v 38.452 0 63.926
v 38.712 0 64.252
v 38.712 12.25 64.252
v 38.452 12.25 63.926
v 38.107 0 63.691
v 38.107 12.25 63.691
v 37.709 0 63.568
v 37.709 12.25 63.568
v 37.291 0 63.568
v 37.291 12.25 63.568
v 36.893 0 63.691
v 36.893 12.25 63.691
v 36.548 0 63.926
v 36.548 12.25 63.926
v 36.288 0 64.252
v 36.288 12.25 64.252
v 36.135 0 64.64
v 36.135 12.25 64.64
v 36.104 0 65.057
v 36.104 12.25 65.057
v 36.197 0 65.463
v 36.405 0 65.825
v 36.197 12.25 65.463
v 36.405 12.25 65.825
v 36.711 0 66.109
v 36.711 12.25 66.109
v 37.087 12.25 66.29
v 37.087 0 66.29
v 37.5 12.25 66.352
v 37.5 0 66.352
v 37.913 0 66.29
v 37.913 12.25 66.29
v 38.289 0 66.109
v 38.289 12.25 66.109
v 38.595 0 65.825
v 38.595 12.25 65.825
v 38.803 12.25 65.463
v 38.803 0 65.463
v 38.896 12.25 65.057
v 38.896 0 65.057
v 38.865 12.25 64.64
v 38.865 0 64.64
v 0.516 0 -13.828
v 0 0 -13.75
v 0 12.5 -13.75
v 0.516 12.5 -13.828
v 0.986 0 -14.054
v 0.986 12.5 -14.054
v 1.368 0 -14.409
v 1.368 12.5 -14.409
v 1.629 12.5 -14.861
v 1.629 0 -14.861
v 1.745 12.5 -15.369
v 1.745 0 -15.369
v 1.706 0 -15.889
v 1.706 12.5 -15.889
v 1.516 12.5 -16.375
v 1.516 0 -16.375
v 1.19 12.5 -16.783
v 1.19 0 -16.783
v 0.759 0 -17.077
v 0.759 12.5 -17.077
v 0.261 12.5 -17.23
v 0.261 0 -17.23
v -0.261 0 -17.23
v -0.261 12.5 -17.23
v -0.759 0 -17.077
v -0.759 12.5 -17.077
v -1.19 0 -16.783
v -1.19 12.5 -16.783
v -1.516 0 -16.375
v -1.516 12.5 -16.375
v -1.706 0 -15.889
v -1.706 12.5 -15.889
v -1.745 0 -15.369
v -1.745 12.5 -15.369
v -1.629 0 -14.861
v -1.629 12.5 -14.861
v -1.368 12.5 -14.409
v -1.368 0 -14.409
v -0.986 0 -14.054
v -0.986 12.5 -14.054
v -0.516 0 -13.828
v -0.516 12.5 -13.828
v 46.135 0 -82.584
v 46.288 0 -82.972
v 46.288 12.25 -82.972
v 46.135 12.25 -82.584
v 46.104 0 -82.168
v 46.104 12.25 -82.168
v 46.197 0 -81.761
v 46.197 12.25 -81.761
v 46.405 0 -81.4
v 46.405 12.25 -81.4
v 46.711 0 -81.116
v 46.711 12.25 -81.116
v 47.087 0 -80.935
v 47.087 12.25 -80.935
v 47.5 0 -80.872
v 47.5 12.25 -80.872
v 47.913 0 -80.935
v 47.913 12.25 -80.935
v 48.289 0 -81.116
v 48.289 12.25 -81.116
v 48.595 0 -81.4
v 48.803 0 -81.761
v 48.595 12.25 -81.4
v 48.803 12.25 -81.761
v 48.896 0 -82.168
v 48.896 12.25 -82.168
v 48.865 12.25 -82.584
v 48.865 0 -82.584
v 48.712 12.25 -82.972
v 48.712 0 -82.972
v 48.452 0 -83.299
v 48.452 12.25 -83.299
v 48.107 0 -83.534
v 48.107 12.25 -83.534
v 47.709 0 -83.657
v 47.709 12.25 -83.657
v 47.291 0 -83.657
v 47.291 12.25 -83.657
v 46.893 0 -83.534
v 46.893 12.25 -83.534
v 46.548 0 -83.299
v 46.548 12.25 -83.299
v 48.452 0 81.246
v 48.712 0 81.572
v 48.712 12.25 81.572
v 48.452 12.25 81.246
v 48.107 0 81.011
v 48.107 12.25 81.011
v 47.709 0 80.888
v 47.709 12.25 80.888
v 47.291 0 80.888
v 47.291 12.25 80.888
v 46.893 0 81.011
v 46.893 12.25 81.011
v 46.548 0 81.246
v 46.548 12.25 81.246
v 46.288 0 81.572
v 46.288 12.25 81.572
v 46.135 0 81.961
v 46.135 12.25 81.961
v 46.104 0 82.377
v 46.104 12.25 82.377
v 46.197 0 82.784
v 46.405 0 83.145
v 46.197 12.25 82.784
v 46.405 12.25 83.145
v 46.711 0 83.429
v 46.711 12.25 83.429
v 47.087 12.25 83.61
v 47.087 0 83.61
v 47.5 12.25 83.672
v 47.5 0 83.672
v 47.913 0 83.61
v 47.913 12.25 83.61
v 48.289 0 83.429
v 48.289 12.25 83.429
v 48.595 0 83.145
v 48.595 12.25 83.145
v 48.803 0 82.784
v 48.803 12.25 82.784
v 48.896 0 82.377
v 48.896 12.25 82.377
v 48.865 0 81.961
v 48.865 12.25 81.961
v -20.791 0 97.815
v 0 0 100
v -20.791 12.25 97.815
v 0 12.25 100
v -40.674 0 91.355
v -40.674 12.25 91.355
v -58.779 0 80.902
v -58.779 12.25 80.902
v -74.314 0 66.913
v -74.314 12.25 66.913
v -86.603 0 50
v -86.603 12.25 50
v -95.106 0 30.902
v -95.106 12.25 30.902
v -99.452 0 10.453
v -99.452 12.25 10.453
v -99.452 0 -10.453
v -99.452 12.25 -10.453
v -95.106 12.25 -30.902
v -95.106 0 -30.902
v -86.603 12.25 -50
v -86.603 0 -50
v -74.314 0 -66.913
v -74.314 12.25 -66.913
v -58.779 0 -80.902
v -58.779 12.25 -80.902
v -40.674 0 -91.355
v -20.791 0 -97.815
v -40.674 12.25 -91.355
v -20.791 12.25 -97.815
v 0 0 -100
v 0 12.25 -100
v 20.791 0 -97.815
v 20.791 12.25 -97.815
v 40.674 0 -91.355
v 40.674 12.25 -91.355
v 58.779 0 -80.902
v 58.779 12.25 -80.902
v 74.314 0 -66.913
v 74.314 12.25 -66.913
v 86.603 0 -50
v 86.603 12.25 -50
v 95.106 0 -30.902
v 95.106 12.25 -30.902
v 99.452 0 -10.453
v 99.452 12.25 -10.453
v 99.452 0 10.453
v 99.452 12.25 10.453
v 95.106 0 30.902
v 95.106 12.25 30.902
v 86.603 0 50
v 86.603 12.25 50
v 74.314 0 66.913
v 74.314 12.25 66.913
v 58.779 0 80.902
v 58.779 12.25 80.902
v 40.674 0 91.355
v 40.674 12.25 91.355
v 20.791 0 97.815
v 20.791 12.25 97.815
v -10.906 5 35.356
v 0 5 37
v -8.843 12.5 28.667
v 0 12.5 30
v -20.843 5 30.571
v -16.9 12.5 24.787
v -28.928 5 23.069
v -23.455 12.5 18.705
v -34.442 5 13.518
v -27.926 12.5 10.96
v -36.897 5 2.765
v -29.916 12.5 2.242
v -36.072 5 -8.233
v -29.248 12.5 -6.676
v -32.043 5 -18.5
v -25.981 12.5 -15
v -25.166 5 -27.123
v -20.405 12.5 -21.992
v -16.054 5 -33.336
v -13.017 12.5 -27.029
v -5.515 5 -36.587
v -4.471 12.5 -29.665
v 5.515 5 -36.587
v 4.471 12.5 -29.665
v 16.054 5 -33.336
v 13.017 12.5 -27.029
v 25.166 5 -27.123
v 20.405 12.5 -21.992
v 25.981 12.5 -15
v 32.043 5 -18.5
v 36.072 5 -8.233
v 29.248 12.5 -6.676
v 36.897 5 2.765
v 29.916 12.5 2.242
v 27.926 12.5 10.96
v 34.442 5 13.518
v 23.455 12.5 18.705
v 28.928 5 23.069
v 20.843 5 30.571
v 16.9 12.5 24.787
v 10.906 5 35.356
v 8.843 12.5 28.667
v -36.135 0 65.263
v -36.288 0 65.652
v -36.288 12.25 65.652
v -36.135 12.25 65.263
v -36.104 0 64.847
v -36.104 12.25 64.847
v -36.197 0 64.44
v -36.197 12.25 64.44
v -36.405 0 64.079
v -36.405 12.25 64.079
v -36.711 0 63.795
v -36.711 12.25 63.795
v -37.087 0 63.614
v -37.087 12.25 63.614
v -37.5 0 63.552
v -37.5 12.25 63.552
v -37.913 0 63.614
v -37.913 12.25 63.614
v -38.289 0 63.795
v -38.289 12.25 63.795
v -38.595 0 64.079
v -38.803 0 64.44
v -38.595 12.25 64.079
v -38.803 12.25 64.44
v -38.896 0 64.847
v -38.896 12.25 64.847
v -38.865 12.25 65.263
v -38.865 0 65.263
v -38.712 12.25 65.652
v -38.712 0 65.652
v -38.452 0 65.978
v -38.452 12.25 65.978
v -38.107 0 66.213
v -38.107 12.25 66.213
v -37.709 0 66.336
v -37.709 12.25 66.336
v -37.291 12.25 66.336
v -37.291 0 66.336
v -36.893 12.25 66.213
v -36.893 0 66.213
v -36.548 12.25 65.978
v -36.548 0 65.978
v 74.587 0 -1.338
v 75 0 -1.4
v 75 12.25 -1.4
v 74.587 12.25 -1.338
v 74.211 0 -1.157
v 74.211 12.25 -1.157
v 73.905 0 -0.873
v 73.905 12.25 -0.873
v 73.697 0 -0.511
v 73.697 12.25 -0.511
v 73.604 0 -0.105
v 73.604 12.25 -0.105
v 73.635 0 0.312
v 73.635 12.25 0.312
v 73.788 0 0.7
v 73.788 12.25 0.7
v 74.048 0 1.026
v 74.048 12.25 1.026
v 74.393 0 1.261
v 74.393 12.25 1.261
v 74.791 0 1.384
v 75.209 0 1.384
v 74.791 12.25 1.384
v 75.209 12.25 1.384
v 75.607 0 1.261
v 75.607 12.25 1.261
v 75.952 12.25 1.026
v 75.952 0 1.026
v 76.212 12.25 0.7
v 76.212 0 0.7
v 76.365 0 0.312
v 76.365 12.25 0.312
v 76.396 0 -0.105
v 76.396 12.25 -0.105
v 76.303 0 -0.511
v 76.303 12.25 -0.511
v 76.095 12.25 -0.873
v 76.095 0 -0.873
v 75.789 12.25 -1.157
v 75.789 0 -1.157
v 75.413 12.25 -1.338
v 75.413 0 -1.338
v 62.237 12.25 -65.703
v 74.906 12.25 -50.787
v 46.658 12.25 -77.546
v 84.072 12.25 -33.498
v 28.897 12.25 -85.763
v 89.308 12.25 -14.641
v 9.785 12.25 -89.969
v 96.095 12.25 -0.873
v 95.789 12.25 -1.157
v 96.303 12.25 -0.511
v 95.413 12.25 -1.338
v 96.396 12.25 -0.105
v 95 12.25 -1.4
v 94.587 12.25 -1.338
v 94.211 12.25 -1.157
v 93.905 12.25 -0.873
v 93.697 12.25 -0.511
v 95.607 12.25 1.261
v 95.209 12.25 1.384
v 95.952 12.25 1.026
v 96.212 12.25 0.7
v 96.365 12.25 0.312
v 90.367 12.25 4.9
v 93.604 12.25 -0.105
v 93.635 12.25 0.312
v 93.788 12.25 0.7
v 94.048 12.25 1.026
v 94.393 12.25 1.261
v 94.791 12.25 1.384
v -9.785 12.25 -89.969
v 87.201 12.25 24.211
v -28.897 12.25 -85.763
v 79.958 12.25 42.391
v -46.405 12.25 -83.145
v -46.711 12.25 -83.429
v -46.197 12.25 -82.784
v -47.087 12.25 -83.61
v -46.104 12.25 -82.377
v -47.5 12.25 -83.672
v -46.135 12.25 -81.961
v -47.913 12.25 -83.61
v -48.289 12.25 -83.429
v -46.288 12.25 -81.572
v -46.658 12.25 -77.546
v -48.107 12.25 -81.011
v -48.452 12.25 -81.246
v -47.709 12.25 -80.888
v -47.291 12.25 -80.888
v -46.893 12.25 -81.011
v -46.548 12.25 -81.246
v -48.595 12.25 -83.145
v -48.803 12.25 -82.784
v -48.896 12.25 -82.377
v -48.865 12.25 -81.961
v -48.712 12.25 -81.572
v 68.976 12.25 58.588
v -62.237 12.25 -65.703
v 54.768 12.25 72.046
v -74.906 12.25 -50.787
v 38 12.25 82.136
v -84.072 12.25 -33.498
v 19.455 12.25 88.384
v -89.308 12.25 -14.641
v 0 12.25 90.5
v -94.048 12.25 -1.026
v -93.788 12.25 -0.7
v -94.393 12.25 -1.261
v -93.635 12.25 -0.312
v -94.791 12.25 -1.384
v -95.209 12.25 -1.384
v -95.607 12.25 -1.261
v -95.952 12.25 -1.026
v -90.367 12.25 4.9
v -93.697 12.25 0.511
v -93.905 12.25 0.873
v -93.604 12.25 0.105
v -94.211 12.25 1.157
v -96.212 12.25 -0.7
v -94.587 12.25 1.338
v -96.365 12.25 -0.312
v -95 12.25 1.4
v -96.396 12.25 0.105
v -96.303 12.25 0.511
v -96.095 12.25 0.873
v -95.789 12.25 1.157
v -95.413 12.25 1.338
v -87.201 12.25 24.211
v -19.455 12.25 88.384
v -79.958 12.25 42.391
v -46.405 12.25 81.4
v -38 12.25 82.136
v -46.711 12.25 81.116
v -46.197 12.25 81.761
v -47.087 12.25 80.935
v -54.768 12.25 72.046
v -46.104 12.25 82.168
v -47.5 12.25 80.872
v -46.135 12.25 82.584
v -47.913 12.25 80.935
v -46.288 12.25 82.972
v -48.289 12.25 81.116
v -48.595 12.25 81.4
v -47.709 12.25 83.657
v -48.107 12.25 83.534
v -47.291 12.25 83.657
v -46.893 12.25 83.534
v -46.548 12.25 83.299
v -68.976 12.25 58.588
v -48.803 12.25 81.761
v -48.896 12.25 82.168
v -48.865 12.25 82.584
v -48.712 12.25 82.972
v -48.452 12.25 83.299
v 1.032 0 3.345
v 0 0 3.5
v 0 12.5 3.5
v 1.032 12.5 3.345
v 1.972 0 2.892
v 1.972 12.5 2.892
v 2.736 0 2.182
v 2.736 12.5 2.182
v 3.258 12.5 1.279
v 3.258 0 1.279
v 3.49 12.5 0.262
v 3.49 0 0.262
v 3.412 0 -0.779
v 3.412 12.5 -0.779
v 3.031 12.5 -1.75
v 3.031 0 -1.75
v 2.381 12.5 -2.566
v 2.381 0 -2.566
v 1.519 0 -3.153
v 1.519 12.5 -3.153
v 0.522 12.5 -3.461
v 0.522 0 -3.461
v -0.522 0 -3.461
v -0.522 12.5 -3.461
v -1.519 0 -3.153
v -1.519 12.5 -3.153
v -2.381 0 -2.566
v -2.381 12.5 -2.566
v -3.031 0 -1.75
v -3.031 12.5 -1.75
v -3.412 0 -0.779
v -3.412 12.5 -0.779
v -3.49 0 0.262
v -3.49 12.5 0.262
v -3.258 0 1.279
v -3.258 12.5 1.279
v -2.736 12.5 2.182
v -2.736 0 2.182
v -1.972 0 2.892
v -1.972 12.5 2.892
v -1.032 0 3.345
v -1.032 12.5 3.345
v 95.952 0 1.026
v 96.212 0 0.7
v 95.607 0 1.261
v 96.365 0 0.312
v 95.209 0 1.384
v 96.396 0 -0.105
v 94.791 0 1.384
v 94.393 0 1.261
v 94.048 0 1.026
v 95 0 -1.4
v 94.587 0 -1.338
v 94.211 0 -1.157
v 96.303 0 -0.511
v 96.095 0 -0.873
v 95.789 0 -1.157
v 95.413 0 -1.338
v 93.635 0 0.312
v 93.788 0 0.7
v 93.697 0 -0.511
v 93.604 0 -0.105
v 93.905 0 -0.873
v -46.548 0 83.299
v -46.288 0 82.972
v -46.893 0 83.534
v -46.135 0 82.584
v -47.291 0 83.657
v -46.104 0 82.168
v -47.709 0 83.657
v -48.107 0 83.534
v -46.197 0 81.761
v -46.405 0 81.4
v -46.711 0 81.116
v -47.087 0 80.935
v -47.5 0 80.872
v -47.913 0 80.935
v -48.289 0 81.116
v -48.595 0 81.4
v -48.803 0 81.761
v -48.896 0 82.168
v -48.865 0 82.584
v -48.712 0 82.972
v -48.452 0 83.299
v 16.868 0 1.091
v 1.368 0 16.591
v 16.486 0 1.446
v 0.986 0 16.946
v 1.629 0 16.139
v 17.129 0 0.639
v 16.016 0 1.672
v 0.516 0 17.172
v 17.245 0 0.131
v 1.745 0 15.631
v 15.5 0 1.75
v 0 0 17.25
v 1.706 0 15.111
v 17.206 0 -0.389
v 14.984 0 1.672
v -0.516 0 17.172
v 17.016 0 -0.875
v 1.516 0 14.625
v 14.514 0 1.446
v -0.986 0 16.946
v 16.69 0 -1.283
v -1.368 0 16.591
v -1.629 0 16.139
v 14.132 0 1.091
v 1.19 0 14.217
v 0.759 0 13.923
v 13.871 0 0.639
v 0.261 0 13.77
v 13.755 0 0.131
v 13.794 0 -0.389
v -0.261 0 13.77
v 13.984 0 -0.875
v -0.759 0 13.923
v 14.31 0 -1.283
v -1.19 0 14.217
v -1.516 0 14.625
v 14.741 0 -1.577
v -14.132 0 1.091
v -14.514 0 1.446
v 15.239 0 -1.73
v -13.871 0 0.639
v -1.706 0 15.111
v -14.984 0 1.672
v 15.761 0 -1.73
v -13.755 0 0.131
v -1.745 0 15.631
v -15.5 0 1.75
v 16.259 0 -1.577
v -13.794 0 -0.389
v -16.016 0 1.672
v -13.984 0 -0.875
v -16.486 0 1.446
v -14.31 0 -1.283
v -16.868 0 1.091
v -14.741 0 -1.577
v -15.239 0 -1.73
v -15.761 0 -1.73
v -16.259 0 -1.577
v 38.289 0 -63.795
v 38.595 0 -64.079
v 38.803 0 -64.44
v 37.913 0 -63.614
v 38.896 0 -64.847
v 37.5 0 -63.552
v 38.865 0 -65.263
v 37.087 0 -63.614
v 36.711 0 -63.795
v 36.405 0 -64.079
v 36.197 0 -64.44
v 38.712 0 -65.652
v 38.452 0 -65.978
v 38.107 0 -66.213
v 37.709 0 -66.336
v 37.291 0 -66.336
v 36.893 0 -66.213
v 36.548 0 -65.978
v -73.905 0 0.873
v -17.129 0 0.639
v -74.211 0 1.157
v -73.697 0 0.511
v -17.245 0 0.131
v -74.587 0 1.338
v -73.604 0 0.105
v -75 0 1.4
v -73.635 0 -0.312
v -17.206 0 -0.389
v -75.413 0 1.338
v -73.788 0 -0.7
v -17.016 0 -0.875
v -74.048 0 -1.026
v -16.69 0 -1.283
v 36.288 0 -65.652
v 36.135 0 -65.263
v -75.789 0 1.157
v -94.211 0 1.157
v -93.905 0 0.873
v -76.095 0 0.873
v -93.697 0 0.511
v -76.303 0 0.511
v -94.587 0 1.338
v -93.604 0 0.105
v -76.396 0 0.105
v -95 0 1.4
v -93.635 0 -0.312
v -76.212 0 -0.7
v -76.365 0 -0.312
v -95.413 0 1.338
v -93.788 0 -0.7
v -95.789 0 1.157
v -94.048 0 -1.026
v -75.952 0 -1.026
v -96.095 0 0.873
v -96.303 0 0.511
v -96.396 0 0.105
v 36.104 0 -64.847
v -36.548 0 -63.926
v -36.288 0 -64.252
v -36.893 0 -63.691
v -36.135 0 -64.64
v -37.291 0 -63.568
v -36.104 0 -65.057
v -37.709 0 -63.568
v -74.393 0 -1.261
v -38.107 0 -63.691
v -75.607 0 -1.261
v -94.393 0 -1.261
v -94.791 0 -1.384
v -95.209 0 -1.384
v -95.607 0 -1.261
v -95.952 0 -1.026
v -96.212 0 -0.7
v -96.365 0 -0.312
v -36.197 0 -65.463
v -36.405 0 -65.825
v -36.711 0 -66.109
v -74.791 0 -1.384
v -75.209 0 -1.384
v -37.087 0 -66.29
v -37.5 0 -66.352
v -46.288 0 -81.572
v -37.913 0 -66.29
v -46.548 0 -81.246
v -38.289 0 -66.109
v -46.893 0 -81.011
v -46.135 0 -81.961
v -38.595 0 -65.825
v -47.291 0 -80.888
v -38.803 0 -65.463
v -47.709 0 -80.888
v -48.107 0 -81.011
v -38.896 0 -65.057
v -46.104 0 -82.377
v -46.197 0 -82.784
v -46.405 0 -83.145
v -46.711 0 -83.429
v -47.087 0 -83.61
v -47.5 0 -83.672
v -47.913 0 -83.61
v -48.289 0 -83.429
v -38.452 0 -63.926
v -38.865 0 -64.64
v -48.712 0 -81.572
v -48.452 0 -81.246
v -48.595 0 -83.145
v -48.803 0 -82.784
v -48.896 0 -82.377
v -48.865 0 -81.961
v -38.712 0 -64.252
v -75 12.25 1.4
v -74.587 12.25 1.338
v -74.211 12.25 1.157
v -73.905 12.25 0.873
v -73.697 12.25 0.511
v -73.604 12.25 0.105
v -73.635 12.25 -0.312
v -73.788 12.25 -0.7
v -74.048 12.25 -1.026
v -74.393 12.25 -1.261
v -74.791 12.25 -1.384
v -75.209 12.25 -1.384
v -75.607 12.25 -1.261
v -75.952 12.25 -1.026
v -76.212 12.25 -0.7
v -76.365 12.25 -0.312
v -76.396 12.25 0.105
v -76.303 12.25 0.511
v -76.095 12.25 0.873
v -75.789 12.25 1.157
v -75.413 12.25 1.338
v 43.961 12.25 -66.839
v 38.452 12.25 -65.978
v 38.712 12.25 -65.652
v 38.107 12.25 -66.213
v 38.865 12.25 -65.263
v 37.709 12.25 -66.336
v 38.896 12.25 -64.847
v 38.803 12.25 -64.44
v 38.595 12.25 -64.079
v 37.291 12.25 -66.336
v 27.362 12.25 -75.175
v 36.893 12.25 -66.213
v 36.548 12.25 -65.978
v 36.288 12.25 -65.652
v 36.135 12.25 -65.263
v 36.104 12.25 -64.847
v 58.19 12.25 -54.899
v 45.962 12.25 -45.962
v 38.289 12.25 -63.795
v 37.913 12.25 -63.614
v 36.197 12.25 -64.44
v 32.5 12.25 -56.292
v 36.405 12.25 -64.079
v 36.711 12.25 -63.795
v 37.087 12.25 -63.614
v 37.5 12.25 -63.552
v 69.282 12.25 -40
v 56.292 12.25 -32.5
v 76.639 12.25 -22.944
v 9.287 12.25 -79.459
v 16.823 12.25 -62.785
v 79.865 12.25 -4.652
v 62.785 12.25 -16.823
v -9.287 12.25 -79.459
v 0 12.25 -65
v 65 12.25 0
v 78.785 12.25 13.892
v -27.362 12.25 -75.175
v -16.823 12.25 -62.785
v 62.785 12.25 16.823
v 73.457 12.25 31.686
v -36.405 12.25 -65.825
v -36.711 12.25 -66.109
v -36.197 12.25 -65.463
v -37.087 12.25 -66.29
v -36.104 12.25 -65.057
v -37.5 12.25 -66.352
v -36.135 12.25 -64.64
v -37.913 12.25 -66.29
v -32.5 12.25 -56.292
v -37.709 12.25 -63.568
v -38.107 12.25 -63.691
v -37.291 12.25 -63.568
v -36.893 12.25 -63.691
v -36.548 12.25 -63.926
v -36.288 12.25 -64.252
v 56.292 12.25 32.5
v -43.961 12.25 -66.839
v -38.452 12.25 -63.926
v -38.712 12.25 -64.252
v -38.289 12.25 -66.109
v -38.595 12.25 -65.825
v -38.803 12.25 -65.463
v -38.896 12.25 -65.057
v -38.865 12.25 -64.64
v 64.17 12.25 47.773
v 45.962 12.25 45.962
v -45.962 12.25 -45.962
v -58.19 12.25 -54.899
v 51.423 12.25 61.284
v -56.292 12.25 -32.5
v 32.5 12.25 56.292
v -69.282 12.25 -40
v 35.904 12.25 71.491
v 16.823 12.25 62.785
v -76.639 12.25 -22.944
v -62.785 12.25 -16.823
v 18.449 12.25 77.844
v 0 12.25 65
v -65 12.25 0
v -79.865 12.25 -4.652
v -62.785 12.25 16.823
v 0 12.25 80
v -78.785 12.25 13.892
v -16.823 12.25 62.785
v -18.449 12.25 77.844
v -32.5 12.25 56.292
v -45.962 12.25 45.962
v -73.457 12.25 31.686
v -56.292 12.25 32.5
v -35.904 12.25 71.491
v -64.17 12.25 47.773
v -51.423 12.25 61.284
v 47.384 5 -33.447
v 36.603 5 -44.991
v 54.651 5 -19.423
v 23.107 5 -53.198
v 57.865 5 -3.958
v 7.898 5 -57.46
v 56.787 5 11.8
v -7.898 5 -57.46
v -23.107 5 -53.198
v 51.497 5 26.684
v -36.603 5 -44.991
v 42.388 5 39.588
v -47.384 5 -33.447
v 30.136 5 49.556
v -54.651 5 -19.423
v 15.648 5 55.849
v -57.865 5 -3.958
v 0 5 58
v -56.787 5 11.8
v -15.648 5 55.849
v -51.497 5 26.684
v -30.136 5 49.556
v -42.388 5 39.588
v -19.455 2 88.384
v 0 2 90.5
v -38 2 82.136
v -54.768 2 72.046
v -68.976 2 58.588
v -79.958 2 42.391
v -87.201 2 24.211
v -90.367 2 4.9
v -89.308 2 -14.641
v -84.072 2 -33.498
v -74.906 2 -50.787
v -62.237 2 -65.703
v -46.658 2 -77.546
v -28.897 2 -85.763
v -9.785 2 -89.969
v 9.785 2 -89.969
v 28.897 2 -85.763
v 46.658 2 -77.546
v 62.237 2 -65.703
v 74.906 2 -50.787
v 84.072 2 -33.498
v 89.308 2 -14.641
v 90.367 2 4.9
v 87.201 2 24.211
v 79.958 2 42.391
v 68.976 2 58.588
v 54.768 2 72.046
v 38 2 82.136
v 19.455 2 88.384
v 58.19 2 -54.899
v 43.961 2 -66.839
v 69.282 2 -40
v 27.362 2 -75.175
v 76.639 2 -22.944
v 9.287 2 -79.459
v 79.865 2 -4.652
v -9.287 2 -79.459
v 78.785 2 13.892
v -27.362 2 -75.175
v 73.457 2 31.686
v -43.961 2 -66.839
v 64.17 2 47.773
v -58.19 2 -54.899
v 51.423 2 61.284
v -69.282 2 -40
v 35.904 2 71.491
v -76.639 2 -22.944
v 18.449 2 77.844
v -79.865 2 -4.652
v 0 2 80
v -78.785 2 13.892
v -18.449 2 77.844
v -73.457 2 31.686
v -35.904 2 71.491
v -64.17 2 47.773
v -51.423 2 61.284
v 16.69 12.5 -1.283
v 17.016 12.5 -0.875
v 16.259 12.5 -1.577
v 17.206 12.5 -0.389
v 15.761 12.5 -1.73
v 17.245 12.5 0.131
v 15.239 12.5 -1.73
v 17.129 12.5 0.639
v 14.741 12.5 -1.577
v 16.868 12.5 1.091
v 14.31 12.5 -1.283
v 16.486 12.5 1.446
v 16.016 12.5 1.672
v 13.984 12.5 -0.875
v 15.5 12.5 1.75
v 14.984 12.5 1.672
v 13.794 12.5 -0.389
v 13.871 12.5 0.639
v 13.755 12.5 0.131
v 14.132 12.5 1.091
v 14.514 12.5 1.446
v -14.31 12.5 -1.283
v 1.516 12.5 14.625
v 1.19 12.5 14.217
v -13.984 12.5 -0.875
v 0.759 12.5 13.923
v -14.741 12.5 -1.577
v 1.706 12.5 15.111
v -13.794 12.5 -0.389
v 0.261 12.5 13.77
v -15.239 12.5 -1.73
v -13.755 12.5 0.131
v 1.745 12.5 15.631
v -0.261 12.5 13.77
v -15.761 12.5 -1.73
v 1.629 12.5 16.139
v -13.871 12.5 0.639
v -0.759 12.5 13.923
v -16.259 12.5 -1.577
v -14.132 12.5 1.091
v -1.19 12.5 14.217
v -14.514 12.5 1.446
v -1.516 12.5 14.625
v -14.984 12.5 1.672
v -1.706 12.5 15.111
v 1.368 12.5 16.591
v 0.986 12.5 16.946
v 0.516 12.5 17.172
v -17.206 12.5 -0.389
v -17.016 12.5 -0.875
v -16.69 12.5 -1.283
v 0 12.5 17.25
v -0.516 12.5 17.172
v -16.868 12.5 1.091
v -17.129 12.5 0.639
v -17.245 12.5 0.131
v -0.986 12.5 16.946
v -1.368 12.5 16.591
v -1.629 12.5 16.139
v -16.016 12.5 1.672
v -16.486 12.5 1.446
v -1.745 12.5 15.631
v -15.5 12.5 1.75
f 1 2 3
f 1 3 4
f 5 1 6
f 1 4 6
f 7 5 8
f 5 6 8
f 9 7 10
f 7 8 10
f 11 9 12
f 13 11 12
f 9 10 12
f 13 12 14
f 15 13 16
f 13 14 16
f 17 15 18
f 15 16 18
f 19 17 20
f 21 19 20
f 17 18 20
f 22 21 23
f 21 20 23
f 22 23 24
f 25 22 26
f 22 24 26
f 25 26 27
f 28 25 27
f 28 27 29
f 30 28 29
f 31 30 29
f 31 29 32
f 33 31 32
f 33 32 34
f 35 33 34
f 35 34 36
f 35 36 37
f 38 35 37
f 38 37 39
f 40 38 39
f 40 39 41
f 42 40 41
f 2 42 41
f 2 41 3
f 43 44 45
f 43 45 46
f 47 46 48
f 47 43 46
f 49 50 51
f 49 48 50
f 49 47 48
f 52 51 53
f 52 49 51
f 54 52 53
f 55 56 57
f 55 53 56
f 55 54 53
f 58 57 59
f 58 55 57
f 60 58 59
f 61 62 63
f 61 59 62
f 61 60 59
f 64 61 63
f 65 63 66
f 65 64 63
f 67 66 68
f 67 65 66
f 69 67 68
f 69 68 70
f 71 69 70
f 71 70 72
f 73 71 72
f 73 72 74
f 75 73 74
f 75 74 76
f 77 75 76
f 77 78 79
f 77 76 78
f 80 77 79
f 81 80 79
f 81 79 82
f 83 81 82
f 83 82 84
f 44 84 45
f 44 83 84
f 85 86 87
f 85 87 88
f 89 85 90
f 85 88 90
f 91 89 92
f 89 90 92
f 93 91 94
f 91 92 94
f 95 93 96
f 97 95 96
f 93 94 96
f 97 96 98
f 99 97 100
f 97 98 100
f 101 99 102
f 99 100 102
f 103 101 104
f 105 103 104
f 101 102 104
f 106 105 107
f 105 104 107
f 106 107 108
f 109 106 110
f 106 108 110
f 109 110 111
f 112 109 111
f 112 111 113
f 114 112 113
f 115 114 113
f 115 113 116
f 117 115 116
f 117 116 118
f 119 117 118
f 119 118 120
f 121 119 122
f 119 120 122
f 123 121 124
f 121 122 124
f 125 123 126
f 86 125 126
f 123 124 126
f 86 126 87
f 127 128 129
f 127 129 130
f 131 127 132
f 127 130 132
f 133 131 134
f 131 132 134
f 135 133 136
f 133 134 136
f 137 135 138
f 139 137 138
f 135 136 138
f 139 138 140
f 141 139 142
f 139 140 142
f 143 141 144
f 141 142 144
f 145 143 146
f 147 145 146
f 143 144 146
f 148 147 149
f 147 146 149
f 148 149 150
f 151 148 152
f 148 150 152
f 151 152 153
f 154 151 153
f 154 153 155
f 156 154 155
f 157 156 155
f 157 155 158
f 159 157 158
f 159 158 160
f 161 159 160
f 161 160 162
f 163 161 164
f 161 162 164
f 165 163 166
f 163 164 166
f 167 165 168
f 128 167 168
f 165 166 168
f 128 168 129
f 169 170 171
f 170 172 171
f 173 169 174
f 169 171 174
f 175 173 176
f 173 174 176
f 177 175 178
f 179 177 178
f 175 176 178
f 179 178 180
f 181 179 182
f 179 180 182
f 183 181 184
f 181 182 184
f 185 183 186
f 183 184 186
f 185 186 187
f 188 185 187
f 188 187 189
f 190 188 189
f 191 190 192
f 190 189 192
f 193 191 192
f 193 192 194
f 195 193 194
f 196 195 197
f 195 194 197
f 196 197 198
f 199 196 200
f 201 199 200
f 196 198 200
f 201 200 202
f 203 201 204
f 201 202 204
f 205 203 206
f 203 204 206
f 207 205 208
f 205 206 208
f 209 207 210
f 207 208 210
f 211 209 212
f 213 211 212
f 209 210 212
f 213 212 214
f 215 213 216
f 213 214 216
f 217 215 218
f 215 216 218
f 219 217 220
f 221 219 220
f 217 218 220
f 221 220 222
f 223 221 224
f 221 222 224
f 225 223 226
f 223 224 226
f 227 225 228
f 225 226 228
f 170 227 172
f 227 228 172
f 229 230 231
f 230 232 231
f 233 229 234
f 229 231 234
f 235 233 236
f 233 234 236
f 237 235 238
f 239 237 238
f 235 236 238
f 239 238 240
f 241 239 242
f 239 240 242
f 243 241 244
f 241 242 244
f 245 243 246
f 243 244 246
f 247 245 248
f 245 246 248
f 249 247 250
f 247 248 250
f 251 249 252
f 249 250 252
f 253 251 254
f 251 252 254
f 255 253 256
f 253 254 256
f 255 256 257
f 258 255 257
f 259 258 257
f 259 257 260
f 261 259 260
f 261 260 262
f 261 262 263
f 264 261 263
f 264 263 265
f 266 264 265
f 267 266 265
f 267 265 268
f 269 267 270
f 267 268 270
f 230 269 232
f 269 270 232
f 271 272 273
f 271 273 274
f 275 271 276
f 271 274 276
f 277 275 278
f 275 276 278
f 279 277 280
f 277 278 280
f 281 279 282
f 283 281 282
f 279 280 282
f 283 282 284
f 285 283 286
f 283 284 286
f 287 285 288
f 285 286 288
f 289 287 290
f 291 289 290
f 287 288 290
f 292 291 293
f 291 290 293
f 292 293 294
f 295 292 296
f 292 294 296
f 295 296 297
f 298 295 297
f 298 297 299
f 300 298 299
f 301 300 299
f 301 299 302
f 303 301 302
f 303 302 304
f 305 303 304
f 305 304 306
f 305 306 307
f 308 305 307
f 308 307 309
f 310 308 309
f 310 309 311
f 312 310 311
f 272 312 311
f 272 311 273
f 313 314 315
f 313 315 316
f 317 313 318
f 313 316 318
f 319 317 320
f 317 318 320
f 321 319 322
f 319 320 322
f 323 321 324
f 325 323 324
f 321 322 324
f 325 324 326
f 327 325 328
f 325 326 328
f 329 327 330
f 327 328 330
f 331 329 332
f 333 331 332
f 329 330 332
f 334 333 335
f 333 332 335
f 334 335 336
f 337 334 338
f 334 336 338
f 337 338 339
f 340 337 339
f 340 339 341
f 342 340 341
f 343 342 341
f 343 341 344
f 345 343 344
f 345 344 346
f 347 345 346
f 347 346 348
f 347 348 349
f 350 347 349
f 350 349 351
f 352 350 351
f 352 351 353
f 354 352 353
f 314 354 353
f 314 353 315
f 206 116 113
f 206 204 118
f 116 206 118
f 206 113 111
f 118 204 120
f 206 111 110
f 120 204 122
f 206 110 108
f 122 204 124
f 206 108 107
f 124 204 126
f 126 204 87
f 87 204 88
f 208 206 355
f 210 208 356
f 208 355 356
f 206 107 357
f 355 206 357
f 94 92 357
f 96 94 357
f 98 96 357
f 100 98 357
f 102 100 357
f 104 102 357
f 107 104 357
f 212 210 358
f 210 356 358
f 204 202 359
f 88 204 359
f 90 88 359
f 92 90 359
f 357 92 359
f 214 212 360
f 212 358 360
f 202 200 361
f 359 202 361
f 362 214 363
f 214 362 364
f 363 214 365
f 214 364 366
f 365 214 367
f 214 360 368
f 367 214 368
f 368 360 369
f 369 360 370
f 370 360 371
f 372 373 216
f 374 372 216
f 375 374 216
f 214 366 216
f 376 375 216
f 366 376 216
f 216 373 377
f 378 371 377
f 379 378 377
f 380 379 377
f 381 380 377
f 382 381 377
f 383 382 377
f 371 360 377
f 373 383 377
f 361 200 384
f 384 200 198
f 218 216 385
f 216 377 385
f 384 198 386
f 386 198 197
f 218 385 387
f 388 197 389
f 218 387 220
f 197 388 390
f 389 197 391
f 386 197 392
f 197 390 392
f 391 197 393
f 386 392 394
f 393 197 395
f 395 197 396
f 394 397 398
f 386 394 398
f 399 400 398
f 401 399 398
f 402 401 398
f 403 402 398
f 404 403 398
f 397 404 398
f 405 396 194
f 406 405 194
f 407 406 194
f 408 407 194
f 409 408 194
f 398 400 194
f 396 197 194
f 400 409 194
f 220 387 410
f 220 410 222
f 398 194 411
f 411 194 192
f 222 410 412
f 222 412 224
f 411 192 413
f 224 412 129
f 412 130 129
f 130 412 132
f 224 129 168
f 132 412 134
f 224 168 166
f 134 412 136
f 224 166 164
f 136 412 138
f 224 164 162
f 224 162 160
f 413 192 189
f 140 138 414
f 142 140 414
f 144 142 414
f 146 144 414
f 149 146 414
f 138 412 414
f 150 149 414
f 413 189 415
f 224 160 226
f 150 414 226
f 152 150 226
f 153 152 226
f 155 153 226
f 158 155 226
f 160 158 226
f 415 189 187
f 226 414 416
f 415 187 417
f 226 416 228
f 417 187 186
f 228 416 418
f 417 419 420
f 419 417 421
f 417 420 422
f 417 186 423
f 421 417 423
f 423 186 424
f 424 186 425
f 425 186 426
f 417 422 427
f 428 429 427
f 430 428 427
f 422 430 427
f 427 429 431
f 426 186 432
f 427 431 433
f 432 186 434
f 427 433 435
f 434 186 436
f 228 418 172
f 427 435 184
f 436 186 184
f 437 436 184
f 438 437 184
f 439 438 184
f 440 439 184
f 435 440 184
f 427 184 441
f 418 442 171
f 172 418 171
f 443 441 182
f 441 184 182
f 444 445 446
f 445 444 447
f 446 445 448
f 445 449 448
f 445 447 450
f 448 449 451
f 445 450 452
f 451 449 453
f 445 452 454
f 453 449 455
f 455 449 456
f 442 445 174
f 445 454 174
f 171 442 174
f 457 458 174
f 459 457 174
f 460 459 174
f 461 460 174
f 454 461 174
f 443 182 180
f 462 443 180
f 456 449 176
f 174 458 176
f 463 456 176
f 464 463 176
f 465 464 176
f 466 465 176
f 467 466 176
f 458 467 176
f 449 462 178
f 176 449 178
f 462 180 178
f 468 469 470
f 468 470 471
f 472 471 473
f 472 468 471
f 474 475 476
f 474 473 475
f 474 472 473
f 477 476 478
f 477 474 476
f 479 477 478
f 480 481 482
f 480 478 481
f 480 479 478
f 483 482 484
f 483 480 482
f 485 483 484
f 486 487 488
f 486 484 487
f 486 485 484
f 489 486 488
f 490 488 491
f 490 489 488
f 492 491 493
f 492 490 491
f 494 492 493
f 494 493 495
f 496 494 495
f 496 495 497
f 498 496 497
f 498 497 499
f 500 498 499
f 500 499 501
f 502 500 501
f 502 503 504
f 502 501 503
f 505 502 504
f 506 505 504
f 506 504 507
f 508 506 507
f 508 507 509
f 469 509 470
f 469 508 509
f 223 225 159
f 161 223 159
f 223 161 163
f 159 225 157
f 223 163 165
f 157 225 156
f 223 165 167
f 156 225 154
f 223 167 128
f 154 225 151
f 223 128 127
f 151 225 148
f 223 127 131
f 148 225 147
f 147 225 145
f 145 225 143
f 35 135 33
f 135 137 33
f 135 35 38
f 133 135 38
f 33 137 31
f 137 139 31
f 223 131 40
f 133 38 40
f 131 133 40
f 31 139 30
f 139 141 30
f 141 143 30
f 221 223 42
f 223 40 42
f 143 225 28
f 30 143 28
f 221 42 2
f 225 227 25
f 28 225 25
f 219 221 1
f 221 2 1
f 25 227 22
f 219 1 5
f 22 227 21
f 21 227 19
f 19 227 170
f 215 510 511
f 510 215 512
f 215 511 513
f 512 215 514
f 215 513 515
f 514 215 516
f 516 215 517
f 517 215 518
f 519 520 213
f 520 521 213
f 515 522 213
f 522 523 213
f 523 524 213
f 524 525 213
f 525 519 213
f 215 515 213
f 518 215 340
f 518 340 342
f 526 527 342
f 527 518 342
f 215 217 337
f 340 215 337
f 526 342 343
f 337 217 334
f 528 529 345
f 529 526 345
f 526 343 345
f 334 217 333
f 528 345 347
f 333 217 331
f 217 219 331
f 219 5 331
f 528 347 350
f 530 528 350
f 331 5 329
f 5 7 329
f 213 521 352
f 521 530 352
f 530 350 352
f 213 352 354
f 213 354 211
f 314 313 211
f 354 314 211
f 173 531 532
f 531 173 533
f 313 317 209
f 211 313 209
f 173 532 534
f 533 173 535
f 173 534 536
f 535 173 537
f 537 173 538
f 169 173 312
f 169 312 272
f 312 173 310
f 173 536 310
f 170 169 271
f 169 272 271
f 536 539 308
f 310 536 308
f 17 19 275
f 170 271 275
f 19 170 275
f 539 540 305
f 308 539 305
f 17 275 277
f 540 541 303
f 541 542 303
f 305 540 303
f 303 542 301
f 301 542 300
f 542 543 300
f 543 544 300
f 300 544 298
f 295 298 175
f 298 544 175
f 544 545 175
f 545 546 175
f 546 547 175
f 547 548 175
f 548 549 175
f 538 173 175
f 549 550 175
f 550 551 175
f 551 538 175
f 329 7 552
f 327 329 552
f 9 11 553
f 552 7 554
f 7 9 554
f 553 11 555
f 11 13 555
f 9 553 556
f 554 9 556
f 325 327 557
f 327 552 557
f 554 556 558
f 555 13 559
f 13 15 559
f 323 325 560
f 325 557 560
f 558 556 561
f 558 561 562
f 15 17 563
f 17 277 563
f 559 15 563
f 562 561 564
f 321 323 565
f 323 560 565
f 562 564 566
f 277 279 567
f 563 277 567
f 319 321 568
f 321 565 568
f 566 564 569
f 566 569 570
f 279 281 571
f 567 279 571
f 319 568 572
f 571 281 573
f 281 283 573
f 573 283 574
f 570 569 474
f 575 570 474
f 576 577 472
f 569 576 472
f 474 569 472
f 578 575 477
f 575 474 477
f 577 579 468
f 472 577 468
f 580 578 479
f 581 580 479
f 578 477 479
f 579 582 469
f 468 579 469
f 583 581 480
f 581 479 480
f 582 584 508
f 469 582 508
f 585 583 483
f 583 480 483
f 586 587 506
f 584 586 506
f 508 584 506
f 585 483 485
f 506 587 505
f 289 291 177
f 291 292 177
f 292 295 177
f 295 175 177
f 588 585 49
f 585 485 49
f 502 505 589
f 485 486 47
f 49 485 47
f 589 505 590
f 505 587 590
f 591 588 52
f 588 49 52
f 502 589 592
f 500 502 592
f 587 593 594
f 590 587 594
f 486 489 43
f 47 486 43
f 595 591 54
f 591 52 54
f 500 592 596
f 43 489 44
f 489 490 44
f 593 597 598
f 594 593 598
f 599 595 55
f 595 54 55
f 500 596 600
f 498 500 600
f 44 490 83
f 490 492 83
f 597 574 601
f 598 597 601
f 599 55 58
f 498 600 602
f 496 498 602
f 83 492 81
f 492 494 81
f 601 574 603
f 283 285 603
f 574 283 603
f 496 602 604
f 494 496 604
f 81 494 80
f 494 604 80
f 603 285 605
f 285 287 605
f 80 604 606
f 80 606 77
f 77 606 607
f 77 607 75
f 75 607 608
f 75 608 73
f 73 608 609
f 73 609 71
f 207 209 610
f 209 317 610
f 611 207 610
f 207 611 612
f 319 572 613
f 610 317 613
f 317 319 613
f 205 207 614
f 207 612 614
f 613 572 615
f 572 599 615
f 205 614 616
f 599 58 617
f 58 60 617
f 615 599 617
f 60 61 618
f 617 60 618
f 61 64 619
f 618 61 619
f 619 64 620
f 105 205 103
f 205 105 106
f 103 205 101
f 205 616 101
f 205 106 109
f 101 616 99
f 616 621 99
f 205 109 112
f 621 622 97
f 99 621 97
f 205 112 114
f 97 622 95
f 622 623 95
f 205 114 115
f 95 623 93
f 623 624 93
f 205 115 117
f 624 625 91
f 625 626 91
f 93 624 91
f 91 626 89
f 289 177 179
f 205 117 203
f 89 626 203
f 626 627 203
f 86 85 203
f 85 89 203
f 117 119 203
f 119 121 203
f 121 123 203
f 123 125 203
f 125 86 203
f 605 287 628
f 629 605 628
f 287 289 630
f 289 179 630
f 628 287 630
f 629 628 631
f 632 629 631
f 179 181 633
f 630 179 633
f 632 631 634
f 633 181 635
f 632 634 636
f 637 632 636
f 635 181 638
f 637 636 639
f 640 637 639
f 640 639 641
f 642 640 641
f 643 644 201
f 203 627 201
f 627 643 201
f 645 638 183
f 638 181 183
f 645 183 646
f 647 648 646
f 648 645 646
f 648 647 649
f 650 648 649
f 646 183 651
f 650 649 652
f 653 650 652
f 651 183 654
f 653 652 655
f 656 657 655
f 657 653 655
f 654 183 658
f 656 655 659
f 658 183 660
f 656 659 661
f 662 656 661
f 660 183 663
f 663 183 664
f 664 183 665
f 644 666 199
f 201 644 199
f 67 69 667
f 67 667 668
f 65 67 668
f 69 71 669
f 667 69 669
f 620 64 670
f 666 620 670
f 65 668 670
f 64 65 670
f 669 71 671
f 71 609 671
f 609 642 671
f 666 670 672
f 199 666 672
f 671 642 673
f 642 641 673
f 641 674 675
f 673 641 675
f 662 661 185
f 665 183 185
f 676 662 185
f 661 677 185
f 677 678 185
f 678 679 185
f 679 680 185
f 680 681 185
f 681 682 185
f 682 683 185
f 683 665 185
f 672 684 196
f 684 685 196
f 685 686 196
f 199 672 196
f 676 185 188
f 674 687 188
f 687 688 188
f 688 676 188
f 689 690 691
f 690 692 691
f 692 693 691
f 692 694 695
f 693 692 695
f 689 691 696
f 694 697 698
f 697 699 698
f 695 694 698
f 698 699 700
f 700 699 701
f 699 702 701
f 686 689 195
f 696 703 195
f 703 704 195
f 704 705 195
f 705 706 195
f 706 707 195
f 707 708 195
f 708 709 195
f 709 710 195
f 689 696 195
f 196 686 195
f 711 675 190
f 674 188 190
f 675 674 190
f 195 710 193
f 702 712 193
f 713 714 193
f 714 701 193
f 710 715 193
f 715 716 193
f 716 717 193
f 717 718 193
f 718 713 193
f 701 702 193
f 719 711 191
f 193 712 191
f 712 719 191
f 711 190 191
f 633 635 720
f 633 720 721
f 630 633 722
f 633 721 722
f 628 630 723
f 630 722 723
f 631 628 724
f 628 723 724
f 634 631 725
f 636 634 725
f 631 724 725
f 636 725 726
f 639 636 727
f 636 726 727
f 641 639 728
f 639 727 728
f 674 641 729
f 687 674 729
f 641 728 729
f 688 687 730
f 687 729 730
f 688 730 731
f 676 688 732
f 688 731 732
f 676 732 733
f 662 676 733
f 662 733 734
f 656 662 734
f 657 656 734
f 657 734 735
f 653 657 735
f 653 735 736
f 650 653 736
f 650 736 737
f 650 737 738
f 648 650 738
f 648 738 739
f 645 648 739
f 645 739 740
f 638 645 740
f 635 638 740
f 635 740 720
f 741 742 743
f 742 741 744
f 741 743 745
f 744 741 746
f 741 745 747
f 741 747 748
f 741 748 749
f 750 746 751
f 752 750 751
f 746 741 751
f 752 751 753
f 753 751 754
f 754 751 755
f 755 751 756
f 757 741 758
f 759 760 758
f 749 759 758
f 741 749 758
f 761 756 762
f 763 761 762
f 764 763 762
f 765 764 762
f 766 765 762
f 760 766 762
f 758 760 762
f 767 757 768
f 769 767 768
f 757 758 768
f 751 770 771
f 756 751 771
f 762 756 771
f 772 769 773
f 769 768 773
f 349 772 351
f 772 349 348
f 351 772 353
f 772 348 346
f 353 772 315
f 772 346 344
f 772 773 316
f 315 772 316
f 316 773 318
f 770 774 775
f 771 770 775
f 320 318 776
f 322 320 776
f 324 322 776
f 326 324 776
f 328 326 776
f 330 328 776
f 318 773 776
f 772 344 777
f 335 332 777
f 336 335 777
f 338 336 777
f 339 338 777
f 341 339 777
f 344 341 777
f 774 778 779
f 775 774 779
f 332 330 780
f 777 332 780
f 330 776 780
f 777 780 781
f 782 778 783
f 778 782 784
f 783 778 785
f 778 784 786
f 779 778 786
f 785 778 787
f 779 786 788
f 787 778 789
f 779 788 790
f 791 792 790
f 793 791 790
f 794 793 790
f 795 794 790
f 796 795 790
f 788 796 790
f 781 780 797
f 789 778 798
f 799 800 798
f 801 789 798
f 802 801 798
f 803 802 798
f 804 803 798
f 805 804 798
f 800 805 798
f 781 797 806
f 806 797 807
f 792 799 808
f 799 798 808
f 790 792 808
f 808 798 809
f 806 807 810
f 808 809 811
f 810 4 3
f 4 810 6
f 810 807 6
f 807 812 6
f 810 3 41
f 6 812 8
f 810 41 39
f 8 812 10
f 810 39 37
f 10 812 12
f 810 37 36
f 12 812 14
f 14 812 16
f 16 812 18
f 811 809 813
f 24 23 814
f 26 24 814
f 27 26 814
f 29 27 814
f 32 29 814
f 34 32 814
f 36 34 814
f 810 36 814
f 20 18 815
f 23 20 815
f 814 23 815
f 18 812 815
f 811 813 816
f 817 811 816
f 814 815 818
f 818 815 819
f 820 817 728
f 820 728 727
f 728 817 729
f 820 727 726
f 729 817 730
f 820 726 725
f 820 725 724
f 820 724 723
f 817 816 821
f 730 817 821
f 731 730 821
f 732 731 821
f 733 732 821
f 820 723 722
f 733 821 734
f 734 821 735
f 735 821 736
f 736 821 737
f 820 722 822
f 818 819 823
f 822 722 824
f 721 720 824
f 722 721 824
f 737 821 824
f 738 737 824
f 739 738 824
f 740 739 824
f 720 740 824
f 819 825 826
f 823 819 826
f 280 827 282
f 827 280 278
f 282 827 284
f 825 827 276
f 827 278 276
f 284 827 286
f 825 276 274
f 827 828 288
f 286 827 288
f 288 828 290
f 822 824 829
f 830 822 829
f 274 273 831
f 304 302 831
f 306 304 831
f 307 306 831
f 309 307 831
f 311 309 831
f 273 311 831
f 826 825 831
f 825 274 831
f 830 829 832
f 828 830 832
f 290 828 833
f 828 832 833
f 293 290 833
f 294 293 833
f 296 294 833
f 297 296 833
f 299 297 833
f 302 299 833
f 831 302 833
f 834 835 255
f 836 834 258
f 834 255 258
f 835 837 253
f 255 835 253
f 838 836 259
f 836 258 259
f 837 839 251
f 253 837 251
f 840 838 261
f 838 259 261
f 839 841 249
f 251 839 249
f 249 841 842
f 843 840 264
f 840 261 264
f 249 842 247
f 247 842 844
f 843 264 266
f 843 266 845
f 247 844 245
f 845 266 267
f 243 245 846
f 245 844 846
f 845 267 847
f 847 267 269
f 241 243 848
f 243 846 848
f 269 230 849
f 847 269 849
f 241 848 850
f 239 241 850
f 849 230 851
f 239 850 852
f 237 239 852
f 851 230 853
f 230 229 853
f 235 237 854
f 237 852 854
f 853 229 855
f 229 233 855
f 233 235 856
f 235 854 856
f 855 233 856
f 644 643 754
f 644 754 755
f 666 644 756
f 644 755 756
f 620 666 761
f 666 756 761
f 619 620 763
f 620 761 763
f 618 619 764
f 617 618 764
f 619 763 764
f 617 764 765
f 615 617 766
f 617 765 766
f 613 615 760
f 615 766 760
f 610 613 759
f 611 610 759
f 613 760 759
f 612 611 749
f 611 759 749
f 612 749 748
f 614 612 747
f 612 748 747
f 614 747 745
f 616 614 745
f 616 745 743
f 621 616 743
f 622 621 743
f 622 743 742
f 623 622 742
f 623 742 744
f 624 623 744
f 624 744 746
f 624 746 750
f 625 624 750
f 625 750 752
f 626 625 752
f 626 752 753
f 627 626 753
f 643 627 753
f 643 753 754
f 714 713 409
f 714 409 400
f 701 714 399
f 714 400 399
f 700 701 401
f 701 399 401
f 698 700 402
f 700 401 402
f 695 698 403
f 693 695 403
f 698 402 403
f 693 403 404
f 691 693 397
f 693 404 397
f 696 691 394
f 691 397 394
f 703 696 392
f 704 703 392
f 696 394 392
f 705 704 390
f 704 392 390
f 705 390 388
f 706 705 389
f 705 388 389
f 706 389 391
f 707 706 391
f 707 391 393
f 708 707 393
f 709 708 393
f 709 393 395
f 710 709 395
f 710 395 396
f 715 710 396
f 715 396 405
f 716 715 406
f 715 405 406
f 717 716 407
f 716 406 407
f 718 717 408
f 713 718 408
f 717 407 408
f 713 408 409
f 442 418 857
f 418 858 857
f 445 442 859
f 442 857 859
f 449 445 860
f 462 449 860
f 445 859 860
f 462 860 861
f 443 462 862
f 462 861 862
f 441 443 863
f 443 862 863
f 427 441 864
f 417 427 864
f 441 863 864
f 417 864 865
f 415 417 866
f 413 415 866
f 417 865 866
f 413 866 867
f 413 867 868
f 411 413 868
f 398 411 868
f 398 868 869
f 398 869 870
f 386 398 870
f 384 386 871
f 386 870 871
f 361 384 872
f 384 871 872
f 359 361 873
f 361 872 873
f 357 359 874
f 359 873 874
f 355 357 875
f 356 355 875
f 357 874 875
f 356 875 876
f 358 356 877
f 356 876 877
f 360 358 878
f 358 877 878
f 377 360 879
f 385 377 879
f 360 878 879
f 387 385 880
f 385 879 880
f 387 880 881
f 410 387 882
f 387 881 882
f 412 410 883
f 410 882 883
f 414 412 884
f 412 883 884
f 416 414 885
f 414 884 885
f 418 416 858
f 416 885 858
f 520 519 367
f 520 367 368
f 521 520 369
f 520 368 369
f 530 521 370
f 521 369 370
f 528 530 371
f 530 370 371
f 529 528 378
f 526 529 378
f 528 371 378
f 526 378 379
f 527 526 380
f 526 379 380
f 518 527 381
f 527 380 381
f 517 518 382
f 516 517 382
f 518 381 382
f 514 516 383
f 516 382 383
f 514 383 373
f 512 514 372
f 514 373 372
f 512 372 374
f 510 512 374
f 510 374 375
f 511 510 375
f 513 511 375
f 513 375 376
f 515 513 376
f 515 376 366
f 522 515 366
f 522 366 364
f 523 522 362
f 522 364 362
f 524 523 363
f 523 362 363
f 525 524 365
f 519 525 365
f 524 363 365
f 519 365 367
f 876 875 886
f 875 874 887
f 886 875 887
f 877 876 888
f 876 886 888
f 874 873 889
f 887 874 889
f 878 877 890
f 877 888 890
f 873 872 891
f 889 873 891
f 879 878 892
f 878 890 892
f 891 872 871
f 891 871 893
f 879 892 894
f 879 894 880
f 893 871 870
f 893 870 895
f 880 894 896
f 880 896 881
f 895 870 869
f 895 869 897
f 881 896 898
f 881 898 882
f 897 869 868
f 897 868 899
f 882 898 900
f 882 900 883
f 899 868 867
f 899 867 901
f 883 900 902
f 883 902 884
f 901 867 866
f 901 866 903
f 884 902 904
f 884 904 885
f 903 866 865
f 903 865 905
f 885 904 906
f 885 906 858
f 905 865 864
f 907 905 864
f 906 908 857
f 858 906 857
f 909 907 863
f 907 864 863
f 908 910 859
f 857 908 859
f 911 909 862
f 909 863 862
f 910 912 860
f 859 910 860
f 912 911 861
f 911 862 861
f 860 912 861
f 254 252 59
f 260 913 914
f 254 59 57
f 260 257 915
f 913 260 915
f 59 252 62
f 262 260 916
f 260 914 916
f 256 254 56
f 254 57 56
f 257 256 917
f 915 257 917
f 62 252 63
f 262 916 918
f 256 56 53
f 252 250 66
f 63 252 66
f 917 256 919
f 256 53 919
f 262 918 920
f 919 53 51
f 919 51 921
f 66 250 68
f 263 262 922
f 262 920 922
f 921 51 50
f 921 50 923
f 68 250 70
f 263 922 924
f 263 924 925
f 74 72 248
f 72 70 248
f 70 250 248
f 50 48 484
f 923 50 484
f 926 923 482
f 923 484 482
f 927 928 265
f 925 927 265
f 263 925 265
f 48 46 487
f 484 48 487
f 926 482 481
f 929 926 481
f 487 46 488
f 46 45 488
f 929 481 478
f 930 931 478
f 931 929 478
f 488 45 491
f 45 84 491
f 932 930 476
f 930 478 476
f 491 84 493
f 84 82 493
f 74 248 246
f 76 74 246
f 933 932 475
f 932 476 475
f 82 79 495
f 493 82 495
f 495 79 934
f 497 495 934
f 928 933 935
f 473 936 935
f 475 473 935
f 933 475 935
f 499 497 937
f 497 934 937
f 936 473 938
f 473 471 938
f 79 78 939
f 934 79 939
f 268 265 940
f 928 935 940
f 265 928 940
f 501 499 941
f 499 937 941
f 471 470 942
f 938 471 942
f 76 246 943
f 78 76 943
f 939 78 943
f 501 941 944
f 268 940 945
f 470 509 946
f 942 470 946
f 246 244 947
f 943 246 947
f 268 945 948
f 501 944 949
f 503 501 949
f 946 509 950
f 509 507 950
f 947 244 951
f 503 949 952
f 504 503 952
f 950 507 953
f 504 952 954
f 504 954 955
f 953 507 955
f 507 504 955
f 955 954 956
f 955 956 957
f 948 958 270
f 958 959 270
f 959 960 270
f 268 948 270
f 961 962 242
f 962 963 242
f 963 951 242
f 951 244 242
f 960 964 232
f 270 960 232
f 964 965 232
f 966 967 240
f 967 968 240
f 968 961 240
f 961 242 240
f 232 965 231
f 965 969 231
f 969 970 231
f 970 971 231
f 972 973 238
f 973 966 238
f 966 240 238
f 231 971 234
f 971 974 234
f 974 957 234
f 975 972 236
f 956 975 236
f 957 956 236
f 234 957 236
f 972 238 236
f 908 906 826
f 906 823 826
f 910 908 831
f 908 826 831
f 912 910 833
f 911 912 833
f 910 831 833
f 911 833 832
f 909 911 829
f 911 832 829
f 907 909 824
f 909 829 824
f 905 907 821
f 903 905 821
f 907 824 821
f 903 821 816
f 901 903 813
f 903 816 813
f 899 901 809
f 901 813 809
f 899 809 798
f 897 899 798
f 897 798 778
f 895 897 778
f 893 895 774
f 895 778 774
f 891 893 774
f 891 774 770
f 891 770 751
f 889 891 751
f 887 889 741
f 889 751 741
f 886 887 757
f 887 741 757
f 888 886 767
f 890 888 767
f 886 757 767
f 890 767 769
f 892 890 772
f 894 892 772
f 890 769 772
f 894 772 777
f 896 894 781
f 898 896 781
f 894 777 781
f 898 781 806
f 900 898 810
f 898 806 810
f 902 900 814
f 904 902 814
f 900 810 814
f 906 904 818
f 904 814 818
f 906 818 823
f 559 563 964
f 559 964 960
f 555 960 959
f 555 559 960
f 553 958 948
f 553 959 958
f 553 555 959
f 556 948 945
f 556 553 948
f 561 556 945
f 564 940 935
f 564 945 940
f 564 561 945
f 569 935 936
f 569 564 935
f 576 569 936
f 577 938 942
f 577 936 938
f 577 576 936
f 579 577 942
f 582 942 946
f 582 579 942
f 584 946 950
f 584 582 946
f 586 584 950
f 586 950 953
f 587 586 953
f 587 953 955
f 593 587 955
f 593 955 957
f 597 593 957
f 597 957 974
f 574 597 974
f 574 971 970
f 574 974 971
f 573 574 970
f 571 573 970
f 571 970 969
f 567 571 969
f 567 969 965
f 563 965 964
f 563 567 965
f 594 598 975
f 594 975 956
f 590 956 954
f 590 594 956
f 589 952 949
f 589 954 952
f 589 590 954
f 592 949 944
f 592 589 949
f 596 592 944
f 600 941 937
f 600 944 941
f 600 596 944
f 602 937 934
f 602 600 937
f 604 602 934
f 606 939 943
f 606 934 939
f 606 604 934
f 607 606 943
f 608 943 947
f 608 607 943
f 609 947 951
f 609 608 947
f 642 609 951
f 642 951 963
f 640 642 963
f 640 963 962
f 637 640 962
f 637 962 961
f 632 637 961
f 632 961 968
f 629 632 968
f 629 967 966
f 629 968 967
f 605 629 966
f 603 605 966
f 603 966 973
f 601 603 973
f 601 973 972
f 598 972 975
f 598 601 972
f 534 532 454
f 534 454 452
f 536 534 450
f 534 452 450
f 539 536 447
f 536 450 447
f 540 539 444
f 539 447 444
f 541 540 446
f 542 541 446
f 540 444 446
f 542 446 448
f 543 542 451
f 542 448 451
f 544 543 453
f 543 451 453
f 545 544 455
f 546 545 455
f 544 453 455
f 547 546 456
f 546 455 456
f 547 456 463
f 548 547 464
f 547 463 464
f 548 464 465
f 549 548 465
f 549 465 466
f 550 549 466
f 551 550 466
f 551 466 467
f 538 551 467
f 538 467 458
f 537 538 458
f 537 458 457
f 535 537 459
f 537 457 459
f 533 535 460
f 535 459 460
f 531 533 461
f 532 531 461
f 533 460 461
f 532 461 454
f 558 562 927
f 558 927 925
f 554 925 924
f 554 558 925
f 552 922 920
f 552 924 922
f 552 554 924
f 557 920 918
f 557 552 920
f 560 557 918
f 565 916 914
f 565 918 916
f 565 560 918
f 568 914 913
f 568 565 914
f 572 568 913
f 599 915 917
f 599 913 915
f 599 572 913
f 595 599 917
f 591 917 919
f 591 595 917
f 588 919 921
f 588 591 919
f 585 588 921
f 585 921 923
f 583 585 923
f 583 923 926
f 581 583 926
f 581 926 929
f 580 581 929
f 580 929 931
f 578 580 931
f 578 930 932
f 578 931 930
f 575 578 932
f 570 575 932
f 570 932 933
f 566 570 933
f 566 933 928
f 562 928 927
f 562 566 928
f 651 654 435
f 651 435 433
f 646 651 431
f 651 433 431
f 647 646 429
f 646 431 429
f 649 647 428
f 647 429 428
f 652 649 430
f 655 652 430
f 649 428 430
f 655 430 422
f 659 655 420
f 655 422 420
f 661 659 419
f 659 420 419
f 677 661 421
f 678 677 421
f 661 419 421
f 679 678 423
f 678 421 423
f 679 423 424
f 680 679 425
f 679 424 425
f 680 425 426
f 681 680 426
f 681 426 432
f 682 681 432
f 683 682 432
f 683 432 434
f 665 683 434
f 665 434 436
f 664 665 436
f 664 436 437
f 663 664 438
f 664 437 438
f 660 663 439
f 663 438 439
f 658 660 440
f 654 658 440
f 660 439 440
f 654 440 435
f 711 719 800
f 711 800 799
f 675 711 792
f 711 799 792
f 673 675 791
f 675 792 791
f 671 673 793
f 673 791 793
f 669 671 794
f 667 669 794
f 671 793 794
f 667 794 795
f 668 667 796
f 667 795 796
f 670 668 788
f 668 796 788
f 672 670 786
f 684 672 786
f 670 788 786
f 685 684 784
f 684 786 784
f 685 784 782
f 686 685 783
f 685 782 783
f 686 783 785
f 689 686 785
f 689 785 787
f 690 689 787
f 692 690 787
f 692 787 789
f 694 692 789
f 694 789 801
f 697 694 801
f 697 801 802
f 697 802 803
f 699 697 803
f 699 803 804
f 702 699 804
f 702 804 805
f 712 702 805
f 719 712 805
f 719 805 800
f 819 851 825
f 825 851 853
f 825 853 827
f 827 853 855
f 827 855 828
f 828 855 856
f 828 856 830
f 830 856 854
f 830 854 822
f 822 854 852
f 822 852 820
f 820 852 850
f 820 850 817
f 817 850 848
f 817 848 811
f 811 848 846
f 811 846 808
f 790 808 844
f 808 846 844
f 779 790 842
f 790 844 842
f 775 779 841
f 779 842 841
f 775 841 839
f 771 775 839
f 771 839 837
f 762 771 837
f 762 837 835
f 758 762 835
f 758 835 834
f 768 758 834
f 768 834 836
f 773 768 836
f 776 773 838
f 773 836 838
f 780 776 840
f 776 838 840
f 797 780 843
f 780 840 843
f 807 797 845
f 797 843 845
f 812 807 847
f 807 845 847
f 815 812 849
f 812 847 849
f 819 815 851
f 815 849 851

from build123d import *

# Parameters (mm, degrees)
KES_EKSTR_ZYON3_DEPTH      = 142.972708645
KES_EKSTR_ZYON3_DEPTH_BACK = 142.972708645
IZIM3_R                    = 3.5
IZIM3_R_2                  = 1.75
IZIM4_R                    = 1.4
KES_EKSTR_ZYON4_DEPTH      = 142.972708645
DAIRESEL_KAPLAMA1_COUNT    = 6


with BuildPart() as part:
    # Çizim2 → Döndür1 (revolve)
    with BuildSketch(Plane(origin=(0, 0, 0), x_dir=(0, 0, -1), z_dir=(1, 0, 0))):
        Polygon((0, 0), (-100, 0), (-100, 12.25), (-90.5, 12.25), (-90.5, 2), (-80, 2), (-80, 12.25), (-65, 12.25), (-58, 5), (-37, 5), (-30, 12.5), (0, 12.5), align=None)
    revolve(axis=Axis((0, 27.631034793, 0), (0, -1, 0)))

    # Çizim3 → Kes-Ekstrüzyon3 (cut, two sides: drawn at the far end of the back side and taken through both)
    with BuildSketch(Plane(origin=(0, 12.5, 0), x_dir=(1, 0, 0), z_dir=(0, 1, 0)).offset(-KES_EKSTR_ZYON3_DEPTH_BACK)):
        with Locations(Location((0, 0, 0), (0, 0, 270))):
            Circle(IZIM3_R)
        with Locations(Location((-15.5, 0, 0), (0, 0, 270))):
            Circle(IZIM3_R_2)
        with Locations(Location((0, -15.5, 0), (0, 0, 270))):
            Circle(IZIM3_R_2)
        with Locations(Location((0, 15.5, 0), (0, 0, 270))):
            Circle(IZIM3_R_2)
        with Locations(Location((15.5, 0, 0), (0, 0, 270))):
            Circle(IZIM3_R_2)
    extrude(amount=KES_EKSTR_ZYON3_DEPTH + KES_EKSTR_ZYON3_DEPTH_BACK, mode=Mode.SUBTRACT)

    # Çizim4 → Kes-Ekstrüzyon4 (cut, symmetric)
    with BuildSketch(Plane(origin=(0, 12.5, 0), x_dir=(1, 0, 0), z_dir=(0, 1, 0))):
        with Locations(Location((-75, 0, 0), (0, 0, 270))):
            Circle(IZIM4_R)
        with Locations(Location((-95, 0, 0), (0, 0, 270))):
            Circle(IZIM4_R)
    kes_ekstr_zyon4 = extrude(amount=KES_EKSTR_ZYON4_DEPTH, both=True, mode=Mode.SUBTRACT)

    # Dairesel Kaplama1: Kes-Ekstrüzyon4 ×6 about axis
    dairesel_kaplama1_axis = Axis((0, 0, 0), (0, 1, 0))
    for i in range(1, DAIRESEL_KAPLAMA1_COUNT):
        add(kes_ekstr_zyon4.rotate(dairesel_kaplama1_axis, i * 360 / DAIRESEL_KAPLAMA1_COUNT), mode=Mode.SUBTRACT)


solid = part.part
